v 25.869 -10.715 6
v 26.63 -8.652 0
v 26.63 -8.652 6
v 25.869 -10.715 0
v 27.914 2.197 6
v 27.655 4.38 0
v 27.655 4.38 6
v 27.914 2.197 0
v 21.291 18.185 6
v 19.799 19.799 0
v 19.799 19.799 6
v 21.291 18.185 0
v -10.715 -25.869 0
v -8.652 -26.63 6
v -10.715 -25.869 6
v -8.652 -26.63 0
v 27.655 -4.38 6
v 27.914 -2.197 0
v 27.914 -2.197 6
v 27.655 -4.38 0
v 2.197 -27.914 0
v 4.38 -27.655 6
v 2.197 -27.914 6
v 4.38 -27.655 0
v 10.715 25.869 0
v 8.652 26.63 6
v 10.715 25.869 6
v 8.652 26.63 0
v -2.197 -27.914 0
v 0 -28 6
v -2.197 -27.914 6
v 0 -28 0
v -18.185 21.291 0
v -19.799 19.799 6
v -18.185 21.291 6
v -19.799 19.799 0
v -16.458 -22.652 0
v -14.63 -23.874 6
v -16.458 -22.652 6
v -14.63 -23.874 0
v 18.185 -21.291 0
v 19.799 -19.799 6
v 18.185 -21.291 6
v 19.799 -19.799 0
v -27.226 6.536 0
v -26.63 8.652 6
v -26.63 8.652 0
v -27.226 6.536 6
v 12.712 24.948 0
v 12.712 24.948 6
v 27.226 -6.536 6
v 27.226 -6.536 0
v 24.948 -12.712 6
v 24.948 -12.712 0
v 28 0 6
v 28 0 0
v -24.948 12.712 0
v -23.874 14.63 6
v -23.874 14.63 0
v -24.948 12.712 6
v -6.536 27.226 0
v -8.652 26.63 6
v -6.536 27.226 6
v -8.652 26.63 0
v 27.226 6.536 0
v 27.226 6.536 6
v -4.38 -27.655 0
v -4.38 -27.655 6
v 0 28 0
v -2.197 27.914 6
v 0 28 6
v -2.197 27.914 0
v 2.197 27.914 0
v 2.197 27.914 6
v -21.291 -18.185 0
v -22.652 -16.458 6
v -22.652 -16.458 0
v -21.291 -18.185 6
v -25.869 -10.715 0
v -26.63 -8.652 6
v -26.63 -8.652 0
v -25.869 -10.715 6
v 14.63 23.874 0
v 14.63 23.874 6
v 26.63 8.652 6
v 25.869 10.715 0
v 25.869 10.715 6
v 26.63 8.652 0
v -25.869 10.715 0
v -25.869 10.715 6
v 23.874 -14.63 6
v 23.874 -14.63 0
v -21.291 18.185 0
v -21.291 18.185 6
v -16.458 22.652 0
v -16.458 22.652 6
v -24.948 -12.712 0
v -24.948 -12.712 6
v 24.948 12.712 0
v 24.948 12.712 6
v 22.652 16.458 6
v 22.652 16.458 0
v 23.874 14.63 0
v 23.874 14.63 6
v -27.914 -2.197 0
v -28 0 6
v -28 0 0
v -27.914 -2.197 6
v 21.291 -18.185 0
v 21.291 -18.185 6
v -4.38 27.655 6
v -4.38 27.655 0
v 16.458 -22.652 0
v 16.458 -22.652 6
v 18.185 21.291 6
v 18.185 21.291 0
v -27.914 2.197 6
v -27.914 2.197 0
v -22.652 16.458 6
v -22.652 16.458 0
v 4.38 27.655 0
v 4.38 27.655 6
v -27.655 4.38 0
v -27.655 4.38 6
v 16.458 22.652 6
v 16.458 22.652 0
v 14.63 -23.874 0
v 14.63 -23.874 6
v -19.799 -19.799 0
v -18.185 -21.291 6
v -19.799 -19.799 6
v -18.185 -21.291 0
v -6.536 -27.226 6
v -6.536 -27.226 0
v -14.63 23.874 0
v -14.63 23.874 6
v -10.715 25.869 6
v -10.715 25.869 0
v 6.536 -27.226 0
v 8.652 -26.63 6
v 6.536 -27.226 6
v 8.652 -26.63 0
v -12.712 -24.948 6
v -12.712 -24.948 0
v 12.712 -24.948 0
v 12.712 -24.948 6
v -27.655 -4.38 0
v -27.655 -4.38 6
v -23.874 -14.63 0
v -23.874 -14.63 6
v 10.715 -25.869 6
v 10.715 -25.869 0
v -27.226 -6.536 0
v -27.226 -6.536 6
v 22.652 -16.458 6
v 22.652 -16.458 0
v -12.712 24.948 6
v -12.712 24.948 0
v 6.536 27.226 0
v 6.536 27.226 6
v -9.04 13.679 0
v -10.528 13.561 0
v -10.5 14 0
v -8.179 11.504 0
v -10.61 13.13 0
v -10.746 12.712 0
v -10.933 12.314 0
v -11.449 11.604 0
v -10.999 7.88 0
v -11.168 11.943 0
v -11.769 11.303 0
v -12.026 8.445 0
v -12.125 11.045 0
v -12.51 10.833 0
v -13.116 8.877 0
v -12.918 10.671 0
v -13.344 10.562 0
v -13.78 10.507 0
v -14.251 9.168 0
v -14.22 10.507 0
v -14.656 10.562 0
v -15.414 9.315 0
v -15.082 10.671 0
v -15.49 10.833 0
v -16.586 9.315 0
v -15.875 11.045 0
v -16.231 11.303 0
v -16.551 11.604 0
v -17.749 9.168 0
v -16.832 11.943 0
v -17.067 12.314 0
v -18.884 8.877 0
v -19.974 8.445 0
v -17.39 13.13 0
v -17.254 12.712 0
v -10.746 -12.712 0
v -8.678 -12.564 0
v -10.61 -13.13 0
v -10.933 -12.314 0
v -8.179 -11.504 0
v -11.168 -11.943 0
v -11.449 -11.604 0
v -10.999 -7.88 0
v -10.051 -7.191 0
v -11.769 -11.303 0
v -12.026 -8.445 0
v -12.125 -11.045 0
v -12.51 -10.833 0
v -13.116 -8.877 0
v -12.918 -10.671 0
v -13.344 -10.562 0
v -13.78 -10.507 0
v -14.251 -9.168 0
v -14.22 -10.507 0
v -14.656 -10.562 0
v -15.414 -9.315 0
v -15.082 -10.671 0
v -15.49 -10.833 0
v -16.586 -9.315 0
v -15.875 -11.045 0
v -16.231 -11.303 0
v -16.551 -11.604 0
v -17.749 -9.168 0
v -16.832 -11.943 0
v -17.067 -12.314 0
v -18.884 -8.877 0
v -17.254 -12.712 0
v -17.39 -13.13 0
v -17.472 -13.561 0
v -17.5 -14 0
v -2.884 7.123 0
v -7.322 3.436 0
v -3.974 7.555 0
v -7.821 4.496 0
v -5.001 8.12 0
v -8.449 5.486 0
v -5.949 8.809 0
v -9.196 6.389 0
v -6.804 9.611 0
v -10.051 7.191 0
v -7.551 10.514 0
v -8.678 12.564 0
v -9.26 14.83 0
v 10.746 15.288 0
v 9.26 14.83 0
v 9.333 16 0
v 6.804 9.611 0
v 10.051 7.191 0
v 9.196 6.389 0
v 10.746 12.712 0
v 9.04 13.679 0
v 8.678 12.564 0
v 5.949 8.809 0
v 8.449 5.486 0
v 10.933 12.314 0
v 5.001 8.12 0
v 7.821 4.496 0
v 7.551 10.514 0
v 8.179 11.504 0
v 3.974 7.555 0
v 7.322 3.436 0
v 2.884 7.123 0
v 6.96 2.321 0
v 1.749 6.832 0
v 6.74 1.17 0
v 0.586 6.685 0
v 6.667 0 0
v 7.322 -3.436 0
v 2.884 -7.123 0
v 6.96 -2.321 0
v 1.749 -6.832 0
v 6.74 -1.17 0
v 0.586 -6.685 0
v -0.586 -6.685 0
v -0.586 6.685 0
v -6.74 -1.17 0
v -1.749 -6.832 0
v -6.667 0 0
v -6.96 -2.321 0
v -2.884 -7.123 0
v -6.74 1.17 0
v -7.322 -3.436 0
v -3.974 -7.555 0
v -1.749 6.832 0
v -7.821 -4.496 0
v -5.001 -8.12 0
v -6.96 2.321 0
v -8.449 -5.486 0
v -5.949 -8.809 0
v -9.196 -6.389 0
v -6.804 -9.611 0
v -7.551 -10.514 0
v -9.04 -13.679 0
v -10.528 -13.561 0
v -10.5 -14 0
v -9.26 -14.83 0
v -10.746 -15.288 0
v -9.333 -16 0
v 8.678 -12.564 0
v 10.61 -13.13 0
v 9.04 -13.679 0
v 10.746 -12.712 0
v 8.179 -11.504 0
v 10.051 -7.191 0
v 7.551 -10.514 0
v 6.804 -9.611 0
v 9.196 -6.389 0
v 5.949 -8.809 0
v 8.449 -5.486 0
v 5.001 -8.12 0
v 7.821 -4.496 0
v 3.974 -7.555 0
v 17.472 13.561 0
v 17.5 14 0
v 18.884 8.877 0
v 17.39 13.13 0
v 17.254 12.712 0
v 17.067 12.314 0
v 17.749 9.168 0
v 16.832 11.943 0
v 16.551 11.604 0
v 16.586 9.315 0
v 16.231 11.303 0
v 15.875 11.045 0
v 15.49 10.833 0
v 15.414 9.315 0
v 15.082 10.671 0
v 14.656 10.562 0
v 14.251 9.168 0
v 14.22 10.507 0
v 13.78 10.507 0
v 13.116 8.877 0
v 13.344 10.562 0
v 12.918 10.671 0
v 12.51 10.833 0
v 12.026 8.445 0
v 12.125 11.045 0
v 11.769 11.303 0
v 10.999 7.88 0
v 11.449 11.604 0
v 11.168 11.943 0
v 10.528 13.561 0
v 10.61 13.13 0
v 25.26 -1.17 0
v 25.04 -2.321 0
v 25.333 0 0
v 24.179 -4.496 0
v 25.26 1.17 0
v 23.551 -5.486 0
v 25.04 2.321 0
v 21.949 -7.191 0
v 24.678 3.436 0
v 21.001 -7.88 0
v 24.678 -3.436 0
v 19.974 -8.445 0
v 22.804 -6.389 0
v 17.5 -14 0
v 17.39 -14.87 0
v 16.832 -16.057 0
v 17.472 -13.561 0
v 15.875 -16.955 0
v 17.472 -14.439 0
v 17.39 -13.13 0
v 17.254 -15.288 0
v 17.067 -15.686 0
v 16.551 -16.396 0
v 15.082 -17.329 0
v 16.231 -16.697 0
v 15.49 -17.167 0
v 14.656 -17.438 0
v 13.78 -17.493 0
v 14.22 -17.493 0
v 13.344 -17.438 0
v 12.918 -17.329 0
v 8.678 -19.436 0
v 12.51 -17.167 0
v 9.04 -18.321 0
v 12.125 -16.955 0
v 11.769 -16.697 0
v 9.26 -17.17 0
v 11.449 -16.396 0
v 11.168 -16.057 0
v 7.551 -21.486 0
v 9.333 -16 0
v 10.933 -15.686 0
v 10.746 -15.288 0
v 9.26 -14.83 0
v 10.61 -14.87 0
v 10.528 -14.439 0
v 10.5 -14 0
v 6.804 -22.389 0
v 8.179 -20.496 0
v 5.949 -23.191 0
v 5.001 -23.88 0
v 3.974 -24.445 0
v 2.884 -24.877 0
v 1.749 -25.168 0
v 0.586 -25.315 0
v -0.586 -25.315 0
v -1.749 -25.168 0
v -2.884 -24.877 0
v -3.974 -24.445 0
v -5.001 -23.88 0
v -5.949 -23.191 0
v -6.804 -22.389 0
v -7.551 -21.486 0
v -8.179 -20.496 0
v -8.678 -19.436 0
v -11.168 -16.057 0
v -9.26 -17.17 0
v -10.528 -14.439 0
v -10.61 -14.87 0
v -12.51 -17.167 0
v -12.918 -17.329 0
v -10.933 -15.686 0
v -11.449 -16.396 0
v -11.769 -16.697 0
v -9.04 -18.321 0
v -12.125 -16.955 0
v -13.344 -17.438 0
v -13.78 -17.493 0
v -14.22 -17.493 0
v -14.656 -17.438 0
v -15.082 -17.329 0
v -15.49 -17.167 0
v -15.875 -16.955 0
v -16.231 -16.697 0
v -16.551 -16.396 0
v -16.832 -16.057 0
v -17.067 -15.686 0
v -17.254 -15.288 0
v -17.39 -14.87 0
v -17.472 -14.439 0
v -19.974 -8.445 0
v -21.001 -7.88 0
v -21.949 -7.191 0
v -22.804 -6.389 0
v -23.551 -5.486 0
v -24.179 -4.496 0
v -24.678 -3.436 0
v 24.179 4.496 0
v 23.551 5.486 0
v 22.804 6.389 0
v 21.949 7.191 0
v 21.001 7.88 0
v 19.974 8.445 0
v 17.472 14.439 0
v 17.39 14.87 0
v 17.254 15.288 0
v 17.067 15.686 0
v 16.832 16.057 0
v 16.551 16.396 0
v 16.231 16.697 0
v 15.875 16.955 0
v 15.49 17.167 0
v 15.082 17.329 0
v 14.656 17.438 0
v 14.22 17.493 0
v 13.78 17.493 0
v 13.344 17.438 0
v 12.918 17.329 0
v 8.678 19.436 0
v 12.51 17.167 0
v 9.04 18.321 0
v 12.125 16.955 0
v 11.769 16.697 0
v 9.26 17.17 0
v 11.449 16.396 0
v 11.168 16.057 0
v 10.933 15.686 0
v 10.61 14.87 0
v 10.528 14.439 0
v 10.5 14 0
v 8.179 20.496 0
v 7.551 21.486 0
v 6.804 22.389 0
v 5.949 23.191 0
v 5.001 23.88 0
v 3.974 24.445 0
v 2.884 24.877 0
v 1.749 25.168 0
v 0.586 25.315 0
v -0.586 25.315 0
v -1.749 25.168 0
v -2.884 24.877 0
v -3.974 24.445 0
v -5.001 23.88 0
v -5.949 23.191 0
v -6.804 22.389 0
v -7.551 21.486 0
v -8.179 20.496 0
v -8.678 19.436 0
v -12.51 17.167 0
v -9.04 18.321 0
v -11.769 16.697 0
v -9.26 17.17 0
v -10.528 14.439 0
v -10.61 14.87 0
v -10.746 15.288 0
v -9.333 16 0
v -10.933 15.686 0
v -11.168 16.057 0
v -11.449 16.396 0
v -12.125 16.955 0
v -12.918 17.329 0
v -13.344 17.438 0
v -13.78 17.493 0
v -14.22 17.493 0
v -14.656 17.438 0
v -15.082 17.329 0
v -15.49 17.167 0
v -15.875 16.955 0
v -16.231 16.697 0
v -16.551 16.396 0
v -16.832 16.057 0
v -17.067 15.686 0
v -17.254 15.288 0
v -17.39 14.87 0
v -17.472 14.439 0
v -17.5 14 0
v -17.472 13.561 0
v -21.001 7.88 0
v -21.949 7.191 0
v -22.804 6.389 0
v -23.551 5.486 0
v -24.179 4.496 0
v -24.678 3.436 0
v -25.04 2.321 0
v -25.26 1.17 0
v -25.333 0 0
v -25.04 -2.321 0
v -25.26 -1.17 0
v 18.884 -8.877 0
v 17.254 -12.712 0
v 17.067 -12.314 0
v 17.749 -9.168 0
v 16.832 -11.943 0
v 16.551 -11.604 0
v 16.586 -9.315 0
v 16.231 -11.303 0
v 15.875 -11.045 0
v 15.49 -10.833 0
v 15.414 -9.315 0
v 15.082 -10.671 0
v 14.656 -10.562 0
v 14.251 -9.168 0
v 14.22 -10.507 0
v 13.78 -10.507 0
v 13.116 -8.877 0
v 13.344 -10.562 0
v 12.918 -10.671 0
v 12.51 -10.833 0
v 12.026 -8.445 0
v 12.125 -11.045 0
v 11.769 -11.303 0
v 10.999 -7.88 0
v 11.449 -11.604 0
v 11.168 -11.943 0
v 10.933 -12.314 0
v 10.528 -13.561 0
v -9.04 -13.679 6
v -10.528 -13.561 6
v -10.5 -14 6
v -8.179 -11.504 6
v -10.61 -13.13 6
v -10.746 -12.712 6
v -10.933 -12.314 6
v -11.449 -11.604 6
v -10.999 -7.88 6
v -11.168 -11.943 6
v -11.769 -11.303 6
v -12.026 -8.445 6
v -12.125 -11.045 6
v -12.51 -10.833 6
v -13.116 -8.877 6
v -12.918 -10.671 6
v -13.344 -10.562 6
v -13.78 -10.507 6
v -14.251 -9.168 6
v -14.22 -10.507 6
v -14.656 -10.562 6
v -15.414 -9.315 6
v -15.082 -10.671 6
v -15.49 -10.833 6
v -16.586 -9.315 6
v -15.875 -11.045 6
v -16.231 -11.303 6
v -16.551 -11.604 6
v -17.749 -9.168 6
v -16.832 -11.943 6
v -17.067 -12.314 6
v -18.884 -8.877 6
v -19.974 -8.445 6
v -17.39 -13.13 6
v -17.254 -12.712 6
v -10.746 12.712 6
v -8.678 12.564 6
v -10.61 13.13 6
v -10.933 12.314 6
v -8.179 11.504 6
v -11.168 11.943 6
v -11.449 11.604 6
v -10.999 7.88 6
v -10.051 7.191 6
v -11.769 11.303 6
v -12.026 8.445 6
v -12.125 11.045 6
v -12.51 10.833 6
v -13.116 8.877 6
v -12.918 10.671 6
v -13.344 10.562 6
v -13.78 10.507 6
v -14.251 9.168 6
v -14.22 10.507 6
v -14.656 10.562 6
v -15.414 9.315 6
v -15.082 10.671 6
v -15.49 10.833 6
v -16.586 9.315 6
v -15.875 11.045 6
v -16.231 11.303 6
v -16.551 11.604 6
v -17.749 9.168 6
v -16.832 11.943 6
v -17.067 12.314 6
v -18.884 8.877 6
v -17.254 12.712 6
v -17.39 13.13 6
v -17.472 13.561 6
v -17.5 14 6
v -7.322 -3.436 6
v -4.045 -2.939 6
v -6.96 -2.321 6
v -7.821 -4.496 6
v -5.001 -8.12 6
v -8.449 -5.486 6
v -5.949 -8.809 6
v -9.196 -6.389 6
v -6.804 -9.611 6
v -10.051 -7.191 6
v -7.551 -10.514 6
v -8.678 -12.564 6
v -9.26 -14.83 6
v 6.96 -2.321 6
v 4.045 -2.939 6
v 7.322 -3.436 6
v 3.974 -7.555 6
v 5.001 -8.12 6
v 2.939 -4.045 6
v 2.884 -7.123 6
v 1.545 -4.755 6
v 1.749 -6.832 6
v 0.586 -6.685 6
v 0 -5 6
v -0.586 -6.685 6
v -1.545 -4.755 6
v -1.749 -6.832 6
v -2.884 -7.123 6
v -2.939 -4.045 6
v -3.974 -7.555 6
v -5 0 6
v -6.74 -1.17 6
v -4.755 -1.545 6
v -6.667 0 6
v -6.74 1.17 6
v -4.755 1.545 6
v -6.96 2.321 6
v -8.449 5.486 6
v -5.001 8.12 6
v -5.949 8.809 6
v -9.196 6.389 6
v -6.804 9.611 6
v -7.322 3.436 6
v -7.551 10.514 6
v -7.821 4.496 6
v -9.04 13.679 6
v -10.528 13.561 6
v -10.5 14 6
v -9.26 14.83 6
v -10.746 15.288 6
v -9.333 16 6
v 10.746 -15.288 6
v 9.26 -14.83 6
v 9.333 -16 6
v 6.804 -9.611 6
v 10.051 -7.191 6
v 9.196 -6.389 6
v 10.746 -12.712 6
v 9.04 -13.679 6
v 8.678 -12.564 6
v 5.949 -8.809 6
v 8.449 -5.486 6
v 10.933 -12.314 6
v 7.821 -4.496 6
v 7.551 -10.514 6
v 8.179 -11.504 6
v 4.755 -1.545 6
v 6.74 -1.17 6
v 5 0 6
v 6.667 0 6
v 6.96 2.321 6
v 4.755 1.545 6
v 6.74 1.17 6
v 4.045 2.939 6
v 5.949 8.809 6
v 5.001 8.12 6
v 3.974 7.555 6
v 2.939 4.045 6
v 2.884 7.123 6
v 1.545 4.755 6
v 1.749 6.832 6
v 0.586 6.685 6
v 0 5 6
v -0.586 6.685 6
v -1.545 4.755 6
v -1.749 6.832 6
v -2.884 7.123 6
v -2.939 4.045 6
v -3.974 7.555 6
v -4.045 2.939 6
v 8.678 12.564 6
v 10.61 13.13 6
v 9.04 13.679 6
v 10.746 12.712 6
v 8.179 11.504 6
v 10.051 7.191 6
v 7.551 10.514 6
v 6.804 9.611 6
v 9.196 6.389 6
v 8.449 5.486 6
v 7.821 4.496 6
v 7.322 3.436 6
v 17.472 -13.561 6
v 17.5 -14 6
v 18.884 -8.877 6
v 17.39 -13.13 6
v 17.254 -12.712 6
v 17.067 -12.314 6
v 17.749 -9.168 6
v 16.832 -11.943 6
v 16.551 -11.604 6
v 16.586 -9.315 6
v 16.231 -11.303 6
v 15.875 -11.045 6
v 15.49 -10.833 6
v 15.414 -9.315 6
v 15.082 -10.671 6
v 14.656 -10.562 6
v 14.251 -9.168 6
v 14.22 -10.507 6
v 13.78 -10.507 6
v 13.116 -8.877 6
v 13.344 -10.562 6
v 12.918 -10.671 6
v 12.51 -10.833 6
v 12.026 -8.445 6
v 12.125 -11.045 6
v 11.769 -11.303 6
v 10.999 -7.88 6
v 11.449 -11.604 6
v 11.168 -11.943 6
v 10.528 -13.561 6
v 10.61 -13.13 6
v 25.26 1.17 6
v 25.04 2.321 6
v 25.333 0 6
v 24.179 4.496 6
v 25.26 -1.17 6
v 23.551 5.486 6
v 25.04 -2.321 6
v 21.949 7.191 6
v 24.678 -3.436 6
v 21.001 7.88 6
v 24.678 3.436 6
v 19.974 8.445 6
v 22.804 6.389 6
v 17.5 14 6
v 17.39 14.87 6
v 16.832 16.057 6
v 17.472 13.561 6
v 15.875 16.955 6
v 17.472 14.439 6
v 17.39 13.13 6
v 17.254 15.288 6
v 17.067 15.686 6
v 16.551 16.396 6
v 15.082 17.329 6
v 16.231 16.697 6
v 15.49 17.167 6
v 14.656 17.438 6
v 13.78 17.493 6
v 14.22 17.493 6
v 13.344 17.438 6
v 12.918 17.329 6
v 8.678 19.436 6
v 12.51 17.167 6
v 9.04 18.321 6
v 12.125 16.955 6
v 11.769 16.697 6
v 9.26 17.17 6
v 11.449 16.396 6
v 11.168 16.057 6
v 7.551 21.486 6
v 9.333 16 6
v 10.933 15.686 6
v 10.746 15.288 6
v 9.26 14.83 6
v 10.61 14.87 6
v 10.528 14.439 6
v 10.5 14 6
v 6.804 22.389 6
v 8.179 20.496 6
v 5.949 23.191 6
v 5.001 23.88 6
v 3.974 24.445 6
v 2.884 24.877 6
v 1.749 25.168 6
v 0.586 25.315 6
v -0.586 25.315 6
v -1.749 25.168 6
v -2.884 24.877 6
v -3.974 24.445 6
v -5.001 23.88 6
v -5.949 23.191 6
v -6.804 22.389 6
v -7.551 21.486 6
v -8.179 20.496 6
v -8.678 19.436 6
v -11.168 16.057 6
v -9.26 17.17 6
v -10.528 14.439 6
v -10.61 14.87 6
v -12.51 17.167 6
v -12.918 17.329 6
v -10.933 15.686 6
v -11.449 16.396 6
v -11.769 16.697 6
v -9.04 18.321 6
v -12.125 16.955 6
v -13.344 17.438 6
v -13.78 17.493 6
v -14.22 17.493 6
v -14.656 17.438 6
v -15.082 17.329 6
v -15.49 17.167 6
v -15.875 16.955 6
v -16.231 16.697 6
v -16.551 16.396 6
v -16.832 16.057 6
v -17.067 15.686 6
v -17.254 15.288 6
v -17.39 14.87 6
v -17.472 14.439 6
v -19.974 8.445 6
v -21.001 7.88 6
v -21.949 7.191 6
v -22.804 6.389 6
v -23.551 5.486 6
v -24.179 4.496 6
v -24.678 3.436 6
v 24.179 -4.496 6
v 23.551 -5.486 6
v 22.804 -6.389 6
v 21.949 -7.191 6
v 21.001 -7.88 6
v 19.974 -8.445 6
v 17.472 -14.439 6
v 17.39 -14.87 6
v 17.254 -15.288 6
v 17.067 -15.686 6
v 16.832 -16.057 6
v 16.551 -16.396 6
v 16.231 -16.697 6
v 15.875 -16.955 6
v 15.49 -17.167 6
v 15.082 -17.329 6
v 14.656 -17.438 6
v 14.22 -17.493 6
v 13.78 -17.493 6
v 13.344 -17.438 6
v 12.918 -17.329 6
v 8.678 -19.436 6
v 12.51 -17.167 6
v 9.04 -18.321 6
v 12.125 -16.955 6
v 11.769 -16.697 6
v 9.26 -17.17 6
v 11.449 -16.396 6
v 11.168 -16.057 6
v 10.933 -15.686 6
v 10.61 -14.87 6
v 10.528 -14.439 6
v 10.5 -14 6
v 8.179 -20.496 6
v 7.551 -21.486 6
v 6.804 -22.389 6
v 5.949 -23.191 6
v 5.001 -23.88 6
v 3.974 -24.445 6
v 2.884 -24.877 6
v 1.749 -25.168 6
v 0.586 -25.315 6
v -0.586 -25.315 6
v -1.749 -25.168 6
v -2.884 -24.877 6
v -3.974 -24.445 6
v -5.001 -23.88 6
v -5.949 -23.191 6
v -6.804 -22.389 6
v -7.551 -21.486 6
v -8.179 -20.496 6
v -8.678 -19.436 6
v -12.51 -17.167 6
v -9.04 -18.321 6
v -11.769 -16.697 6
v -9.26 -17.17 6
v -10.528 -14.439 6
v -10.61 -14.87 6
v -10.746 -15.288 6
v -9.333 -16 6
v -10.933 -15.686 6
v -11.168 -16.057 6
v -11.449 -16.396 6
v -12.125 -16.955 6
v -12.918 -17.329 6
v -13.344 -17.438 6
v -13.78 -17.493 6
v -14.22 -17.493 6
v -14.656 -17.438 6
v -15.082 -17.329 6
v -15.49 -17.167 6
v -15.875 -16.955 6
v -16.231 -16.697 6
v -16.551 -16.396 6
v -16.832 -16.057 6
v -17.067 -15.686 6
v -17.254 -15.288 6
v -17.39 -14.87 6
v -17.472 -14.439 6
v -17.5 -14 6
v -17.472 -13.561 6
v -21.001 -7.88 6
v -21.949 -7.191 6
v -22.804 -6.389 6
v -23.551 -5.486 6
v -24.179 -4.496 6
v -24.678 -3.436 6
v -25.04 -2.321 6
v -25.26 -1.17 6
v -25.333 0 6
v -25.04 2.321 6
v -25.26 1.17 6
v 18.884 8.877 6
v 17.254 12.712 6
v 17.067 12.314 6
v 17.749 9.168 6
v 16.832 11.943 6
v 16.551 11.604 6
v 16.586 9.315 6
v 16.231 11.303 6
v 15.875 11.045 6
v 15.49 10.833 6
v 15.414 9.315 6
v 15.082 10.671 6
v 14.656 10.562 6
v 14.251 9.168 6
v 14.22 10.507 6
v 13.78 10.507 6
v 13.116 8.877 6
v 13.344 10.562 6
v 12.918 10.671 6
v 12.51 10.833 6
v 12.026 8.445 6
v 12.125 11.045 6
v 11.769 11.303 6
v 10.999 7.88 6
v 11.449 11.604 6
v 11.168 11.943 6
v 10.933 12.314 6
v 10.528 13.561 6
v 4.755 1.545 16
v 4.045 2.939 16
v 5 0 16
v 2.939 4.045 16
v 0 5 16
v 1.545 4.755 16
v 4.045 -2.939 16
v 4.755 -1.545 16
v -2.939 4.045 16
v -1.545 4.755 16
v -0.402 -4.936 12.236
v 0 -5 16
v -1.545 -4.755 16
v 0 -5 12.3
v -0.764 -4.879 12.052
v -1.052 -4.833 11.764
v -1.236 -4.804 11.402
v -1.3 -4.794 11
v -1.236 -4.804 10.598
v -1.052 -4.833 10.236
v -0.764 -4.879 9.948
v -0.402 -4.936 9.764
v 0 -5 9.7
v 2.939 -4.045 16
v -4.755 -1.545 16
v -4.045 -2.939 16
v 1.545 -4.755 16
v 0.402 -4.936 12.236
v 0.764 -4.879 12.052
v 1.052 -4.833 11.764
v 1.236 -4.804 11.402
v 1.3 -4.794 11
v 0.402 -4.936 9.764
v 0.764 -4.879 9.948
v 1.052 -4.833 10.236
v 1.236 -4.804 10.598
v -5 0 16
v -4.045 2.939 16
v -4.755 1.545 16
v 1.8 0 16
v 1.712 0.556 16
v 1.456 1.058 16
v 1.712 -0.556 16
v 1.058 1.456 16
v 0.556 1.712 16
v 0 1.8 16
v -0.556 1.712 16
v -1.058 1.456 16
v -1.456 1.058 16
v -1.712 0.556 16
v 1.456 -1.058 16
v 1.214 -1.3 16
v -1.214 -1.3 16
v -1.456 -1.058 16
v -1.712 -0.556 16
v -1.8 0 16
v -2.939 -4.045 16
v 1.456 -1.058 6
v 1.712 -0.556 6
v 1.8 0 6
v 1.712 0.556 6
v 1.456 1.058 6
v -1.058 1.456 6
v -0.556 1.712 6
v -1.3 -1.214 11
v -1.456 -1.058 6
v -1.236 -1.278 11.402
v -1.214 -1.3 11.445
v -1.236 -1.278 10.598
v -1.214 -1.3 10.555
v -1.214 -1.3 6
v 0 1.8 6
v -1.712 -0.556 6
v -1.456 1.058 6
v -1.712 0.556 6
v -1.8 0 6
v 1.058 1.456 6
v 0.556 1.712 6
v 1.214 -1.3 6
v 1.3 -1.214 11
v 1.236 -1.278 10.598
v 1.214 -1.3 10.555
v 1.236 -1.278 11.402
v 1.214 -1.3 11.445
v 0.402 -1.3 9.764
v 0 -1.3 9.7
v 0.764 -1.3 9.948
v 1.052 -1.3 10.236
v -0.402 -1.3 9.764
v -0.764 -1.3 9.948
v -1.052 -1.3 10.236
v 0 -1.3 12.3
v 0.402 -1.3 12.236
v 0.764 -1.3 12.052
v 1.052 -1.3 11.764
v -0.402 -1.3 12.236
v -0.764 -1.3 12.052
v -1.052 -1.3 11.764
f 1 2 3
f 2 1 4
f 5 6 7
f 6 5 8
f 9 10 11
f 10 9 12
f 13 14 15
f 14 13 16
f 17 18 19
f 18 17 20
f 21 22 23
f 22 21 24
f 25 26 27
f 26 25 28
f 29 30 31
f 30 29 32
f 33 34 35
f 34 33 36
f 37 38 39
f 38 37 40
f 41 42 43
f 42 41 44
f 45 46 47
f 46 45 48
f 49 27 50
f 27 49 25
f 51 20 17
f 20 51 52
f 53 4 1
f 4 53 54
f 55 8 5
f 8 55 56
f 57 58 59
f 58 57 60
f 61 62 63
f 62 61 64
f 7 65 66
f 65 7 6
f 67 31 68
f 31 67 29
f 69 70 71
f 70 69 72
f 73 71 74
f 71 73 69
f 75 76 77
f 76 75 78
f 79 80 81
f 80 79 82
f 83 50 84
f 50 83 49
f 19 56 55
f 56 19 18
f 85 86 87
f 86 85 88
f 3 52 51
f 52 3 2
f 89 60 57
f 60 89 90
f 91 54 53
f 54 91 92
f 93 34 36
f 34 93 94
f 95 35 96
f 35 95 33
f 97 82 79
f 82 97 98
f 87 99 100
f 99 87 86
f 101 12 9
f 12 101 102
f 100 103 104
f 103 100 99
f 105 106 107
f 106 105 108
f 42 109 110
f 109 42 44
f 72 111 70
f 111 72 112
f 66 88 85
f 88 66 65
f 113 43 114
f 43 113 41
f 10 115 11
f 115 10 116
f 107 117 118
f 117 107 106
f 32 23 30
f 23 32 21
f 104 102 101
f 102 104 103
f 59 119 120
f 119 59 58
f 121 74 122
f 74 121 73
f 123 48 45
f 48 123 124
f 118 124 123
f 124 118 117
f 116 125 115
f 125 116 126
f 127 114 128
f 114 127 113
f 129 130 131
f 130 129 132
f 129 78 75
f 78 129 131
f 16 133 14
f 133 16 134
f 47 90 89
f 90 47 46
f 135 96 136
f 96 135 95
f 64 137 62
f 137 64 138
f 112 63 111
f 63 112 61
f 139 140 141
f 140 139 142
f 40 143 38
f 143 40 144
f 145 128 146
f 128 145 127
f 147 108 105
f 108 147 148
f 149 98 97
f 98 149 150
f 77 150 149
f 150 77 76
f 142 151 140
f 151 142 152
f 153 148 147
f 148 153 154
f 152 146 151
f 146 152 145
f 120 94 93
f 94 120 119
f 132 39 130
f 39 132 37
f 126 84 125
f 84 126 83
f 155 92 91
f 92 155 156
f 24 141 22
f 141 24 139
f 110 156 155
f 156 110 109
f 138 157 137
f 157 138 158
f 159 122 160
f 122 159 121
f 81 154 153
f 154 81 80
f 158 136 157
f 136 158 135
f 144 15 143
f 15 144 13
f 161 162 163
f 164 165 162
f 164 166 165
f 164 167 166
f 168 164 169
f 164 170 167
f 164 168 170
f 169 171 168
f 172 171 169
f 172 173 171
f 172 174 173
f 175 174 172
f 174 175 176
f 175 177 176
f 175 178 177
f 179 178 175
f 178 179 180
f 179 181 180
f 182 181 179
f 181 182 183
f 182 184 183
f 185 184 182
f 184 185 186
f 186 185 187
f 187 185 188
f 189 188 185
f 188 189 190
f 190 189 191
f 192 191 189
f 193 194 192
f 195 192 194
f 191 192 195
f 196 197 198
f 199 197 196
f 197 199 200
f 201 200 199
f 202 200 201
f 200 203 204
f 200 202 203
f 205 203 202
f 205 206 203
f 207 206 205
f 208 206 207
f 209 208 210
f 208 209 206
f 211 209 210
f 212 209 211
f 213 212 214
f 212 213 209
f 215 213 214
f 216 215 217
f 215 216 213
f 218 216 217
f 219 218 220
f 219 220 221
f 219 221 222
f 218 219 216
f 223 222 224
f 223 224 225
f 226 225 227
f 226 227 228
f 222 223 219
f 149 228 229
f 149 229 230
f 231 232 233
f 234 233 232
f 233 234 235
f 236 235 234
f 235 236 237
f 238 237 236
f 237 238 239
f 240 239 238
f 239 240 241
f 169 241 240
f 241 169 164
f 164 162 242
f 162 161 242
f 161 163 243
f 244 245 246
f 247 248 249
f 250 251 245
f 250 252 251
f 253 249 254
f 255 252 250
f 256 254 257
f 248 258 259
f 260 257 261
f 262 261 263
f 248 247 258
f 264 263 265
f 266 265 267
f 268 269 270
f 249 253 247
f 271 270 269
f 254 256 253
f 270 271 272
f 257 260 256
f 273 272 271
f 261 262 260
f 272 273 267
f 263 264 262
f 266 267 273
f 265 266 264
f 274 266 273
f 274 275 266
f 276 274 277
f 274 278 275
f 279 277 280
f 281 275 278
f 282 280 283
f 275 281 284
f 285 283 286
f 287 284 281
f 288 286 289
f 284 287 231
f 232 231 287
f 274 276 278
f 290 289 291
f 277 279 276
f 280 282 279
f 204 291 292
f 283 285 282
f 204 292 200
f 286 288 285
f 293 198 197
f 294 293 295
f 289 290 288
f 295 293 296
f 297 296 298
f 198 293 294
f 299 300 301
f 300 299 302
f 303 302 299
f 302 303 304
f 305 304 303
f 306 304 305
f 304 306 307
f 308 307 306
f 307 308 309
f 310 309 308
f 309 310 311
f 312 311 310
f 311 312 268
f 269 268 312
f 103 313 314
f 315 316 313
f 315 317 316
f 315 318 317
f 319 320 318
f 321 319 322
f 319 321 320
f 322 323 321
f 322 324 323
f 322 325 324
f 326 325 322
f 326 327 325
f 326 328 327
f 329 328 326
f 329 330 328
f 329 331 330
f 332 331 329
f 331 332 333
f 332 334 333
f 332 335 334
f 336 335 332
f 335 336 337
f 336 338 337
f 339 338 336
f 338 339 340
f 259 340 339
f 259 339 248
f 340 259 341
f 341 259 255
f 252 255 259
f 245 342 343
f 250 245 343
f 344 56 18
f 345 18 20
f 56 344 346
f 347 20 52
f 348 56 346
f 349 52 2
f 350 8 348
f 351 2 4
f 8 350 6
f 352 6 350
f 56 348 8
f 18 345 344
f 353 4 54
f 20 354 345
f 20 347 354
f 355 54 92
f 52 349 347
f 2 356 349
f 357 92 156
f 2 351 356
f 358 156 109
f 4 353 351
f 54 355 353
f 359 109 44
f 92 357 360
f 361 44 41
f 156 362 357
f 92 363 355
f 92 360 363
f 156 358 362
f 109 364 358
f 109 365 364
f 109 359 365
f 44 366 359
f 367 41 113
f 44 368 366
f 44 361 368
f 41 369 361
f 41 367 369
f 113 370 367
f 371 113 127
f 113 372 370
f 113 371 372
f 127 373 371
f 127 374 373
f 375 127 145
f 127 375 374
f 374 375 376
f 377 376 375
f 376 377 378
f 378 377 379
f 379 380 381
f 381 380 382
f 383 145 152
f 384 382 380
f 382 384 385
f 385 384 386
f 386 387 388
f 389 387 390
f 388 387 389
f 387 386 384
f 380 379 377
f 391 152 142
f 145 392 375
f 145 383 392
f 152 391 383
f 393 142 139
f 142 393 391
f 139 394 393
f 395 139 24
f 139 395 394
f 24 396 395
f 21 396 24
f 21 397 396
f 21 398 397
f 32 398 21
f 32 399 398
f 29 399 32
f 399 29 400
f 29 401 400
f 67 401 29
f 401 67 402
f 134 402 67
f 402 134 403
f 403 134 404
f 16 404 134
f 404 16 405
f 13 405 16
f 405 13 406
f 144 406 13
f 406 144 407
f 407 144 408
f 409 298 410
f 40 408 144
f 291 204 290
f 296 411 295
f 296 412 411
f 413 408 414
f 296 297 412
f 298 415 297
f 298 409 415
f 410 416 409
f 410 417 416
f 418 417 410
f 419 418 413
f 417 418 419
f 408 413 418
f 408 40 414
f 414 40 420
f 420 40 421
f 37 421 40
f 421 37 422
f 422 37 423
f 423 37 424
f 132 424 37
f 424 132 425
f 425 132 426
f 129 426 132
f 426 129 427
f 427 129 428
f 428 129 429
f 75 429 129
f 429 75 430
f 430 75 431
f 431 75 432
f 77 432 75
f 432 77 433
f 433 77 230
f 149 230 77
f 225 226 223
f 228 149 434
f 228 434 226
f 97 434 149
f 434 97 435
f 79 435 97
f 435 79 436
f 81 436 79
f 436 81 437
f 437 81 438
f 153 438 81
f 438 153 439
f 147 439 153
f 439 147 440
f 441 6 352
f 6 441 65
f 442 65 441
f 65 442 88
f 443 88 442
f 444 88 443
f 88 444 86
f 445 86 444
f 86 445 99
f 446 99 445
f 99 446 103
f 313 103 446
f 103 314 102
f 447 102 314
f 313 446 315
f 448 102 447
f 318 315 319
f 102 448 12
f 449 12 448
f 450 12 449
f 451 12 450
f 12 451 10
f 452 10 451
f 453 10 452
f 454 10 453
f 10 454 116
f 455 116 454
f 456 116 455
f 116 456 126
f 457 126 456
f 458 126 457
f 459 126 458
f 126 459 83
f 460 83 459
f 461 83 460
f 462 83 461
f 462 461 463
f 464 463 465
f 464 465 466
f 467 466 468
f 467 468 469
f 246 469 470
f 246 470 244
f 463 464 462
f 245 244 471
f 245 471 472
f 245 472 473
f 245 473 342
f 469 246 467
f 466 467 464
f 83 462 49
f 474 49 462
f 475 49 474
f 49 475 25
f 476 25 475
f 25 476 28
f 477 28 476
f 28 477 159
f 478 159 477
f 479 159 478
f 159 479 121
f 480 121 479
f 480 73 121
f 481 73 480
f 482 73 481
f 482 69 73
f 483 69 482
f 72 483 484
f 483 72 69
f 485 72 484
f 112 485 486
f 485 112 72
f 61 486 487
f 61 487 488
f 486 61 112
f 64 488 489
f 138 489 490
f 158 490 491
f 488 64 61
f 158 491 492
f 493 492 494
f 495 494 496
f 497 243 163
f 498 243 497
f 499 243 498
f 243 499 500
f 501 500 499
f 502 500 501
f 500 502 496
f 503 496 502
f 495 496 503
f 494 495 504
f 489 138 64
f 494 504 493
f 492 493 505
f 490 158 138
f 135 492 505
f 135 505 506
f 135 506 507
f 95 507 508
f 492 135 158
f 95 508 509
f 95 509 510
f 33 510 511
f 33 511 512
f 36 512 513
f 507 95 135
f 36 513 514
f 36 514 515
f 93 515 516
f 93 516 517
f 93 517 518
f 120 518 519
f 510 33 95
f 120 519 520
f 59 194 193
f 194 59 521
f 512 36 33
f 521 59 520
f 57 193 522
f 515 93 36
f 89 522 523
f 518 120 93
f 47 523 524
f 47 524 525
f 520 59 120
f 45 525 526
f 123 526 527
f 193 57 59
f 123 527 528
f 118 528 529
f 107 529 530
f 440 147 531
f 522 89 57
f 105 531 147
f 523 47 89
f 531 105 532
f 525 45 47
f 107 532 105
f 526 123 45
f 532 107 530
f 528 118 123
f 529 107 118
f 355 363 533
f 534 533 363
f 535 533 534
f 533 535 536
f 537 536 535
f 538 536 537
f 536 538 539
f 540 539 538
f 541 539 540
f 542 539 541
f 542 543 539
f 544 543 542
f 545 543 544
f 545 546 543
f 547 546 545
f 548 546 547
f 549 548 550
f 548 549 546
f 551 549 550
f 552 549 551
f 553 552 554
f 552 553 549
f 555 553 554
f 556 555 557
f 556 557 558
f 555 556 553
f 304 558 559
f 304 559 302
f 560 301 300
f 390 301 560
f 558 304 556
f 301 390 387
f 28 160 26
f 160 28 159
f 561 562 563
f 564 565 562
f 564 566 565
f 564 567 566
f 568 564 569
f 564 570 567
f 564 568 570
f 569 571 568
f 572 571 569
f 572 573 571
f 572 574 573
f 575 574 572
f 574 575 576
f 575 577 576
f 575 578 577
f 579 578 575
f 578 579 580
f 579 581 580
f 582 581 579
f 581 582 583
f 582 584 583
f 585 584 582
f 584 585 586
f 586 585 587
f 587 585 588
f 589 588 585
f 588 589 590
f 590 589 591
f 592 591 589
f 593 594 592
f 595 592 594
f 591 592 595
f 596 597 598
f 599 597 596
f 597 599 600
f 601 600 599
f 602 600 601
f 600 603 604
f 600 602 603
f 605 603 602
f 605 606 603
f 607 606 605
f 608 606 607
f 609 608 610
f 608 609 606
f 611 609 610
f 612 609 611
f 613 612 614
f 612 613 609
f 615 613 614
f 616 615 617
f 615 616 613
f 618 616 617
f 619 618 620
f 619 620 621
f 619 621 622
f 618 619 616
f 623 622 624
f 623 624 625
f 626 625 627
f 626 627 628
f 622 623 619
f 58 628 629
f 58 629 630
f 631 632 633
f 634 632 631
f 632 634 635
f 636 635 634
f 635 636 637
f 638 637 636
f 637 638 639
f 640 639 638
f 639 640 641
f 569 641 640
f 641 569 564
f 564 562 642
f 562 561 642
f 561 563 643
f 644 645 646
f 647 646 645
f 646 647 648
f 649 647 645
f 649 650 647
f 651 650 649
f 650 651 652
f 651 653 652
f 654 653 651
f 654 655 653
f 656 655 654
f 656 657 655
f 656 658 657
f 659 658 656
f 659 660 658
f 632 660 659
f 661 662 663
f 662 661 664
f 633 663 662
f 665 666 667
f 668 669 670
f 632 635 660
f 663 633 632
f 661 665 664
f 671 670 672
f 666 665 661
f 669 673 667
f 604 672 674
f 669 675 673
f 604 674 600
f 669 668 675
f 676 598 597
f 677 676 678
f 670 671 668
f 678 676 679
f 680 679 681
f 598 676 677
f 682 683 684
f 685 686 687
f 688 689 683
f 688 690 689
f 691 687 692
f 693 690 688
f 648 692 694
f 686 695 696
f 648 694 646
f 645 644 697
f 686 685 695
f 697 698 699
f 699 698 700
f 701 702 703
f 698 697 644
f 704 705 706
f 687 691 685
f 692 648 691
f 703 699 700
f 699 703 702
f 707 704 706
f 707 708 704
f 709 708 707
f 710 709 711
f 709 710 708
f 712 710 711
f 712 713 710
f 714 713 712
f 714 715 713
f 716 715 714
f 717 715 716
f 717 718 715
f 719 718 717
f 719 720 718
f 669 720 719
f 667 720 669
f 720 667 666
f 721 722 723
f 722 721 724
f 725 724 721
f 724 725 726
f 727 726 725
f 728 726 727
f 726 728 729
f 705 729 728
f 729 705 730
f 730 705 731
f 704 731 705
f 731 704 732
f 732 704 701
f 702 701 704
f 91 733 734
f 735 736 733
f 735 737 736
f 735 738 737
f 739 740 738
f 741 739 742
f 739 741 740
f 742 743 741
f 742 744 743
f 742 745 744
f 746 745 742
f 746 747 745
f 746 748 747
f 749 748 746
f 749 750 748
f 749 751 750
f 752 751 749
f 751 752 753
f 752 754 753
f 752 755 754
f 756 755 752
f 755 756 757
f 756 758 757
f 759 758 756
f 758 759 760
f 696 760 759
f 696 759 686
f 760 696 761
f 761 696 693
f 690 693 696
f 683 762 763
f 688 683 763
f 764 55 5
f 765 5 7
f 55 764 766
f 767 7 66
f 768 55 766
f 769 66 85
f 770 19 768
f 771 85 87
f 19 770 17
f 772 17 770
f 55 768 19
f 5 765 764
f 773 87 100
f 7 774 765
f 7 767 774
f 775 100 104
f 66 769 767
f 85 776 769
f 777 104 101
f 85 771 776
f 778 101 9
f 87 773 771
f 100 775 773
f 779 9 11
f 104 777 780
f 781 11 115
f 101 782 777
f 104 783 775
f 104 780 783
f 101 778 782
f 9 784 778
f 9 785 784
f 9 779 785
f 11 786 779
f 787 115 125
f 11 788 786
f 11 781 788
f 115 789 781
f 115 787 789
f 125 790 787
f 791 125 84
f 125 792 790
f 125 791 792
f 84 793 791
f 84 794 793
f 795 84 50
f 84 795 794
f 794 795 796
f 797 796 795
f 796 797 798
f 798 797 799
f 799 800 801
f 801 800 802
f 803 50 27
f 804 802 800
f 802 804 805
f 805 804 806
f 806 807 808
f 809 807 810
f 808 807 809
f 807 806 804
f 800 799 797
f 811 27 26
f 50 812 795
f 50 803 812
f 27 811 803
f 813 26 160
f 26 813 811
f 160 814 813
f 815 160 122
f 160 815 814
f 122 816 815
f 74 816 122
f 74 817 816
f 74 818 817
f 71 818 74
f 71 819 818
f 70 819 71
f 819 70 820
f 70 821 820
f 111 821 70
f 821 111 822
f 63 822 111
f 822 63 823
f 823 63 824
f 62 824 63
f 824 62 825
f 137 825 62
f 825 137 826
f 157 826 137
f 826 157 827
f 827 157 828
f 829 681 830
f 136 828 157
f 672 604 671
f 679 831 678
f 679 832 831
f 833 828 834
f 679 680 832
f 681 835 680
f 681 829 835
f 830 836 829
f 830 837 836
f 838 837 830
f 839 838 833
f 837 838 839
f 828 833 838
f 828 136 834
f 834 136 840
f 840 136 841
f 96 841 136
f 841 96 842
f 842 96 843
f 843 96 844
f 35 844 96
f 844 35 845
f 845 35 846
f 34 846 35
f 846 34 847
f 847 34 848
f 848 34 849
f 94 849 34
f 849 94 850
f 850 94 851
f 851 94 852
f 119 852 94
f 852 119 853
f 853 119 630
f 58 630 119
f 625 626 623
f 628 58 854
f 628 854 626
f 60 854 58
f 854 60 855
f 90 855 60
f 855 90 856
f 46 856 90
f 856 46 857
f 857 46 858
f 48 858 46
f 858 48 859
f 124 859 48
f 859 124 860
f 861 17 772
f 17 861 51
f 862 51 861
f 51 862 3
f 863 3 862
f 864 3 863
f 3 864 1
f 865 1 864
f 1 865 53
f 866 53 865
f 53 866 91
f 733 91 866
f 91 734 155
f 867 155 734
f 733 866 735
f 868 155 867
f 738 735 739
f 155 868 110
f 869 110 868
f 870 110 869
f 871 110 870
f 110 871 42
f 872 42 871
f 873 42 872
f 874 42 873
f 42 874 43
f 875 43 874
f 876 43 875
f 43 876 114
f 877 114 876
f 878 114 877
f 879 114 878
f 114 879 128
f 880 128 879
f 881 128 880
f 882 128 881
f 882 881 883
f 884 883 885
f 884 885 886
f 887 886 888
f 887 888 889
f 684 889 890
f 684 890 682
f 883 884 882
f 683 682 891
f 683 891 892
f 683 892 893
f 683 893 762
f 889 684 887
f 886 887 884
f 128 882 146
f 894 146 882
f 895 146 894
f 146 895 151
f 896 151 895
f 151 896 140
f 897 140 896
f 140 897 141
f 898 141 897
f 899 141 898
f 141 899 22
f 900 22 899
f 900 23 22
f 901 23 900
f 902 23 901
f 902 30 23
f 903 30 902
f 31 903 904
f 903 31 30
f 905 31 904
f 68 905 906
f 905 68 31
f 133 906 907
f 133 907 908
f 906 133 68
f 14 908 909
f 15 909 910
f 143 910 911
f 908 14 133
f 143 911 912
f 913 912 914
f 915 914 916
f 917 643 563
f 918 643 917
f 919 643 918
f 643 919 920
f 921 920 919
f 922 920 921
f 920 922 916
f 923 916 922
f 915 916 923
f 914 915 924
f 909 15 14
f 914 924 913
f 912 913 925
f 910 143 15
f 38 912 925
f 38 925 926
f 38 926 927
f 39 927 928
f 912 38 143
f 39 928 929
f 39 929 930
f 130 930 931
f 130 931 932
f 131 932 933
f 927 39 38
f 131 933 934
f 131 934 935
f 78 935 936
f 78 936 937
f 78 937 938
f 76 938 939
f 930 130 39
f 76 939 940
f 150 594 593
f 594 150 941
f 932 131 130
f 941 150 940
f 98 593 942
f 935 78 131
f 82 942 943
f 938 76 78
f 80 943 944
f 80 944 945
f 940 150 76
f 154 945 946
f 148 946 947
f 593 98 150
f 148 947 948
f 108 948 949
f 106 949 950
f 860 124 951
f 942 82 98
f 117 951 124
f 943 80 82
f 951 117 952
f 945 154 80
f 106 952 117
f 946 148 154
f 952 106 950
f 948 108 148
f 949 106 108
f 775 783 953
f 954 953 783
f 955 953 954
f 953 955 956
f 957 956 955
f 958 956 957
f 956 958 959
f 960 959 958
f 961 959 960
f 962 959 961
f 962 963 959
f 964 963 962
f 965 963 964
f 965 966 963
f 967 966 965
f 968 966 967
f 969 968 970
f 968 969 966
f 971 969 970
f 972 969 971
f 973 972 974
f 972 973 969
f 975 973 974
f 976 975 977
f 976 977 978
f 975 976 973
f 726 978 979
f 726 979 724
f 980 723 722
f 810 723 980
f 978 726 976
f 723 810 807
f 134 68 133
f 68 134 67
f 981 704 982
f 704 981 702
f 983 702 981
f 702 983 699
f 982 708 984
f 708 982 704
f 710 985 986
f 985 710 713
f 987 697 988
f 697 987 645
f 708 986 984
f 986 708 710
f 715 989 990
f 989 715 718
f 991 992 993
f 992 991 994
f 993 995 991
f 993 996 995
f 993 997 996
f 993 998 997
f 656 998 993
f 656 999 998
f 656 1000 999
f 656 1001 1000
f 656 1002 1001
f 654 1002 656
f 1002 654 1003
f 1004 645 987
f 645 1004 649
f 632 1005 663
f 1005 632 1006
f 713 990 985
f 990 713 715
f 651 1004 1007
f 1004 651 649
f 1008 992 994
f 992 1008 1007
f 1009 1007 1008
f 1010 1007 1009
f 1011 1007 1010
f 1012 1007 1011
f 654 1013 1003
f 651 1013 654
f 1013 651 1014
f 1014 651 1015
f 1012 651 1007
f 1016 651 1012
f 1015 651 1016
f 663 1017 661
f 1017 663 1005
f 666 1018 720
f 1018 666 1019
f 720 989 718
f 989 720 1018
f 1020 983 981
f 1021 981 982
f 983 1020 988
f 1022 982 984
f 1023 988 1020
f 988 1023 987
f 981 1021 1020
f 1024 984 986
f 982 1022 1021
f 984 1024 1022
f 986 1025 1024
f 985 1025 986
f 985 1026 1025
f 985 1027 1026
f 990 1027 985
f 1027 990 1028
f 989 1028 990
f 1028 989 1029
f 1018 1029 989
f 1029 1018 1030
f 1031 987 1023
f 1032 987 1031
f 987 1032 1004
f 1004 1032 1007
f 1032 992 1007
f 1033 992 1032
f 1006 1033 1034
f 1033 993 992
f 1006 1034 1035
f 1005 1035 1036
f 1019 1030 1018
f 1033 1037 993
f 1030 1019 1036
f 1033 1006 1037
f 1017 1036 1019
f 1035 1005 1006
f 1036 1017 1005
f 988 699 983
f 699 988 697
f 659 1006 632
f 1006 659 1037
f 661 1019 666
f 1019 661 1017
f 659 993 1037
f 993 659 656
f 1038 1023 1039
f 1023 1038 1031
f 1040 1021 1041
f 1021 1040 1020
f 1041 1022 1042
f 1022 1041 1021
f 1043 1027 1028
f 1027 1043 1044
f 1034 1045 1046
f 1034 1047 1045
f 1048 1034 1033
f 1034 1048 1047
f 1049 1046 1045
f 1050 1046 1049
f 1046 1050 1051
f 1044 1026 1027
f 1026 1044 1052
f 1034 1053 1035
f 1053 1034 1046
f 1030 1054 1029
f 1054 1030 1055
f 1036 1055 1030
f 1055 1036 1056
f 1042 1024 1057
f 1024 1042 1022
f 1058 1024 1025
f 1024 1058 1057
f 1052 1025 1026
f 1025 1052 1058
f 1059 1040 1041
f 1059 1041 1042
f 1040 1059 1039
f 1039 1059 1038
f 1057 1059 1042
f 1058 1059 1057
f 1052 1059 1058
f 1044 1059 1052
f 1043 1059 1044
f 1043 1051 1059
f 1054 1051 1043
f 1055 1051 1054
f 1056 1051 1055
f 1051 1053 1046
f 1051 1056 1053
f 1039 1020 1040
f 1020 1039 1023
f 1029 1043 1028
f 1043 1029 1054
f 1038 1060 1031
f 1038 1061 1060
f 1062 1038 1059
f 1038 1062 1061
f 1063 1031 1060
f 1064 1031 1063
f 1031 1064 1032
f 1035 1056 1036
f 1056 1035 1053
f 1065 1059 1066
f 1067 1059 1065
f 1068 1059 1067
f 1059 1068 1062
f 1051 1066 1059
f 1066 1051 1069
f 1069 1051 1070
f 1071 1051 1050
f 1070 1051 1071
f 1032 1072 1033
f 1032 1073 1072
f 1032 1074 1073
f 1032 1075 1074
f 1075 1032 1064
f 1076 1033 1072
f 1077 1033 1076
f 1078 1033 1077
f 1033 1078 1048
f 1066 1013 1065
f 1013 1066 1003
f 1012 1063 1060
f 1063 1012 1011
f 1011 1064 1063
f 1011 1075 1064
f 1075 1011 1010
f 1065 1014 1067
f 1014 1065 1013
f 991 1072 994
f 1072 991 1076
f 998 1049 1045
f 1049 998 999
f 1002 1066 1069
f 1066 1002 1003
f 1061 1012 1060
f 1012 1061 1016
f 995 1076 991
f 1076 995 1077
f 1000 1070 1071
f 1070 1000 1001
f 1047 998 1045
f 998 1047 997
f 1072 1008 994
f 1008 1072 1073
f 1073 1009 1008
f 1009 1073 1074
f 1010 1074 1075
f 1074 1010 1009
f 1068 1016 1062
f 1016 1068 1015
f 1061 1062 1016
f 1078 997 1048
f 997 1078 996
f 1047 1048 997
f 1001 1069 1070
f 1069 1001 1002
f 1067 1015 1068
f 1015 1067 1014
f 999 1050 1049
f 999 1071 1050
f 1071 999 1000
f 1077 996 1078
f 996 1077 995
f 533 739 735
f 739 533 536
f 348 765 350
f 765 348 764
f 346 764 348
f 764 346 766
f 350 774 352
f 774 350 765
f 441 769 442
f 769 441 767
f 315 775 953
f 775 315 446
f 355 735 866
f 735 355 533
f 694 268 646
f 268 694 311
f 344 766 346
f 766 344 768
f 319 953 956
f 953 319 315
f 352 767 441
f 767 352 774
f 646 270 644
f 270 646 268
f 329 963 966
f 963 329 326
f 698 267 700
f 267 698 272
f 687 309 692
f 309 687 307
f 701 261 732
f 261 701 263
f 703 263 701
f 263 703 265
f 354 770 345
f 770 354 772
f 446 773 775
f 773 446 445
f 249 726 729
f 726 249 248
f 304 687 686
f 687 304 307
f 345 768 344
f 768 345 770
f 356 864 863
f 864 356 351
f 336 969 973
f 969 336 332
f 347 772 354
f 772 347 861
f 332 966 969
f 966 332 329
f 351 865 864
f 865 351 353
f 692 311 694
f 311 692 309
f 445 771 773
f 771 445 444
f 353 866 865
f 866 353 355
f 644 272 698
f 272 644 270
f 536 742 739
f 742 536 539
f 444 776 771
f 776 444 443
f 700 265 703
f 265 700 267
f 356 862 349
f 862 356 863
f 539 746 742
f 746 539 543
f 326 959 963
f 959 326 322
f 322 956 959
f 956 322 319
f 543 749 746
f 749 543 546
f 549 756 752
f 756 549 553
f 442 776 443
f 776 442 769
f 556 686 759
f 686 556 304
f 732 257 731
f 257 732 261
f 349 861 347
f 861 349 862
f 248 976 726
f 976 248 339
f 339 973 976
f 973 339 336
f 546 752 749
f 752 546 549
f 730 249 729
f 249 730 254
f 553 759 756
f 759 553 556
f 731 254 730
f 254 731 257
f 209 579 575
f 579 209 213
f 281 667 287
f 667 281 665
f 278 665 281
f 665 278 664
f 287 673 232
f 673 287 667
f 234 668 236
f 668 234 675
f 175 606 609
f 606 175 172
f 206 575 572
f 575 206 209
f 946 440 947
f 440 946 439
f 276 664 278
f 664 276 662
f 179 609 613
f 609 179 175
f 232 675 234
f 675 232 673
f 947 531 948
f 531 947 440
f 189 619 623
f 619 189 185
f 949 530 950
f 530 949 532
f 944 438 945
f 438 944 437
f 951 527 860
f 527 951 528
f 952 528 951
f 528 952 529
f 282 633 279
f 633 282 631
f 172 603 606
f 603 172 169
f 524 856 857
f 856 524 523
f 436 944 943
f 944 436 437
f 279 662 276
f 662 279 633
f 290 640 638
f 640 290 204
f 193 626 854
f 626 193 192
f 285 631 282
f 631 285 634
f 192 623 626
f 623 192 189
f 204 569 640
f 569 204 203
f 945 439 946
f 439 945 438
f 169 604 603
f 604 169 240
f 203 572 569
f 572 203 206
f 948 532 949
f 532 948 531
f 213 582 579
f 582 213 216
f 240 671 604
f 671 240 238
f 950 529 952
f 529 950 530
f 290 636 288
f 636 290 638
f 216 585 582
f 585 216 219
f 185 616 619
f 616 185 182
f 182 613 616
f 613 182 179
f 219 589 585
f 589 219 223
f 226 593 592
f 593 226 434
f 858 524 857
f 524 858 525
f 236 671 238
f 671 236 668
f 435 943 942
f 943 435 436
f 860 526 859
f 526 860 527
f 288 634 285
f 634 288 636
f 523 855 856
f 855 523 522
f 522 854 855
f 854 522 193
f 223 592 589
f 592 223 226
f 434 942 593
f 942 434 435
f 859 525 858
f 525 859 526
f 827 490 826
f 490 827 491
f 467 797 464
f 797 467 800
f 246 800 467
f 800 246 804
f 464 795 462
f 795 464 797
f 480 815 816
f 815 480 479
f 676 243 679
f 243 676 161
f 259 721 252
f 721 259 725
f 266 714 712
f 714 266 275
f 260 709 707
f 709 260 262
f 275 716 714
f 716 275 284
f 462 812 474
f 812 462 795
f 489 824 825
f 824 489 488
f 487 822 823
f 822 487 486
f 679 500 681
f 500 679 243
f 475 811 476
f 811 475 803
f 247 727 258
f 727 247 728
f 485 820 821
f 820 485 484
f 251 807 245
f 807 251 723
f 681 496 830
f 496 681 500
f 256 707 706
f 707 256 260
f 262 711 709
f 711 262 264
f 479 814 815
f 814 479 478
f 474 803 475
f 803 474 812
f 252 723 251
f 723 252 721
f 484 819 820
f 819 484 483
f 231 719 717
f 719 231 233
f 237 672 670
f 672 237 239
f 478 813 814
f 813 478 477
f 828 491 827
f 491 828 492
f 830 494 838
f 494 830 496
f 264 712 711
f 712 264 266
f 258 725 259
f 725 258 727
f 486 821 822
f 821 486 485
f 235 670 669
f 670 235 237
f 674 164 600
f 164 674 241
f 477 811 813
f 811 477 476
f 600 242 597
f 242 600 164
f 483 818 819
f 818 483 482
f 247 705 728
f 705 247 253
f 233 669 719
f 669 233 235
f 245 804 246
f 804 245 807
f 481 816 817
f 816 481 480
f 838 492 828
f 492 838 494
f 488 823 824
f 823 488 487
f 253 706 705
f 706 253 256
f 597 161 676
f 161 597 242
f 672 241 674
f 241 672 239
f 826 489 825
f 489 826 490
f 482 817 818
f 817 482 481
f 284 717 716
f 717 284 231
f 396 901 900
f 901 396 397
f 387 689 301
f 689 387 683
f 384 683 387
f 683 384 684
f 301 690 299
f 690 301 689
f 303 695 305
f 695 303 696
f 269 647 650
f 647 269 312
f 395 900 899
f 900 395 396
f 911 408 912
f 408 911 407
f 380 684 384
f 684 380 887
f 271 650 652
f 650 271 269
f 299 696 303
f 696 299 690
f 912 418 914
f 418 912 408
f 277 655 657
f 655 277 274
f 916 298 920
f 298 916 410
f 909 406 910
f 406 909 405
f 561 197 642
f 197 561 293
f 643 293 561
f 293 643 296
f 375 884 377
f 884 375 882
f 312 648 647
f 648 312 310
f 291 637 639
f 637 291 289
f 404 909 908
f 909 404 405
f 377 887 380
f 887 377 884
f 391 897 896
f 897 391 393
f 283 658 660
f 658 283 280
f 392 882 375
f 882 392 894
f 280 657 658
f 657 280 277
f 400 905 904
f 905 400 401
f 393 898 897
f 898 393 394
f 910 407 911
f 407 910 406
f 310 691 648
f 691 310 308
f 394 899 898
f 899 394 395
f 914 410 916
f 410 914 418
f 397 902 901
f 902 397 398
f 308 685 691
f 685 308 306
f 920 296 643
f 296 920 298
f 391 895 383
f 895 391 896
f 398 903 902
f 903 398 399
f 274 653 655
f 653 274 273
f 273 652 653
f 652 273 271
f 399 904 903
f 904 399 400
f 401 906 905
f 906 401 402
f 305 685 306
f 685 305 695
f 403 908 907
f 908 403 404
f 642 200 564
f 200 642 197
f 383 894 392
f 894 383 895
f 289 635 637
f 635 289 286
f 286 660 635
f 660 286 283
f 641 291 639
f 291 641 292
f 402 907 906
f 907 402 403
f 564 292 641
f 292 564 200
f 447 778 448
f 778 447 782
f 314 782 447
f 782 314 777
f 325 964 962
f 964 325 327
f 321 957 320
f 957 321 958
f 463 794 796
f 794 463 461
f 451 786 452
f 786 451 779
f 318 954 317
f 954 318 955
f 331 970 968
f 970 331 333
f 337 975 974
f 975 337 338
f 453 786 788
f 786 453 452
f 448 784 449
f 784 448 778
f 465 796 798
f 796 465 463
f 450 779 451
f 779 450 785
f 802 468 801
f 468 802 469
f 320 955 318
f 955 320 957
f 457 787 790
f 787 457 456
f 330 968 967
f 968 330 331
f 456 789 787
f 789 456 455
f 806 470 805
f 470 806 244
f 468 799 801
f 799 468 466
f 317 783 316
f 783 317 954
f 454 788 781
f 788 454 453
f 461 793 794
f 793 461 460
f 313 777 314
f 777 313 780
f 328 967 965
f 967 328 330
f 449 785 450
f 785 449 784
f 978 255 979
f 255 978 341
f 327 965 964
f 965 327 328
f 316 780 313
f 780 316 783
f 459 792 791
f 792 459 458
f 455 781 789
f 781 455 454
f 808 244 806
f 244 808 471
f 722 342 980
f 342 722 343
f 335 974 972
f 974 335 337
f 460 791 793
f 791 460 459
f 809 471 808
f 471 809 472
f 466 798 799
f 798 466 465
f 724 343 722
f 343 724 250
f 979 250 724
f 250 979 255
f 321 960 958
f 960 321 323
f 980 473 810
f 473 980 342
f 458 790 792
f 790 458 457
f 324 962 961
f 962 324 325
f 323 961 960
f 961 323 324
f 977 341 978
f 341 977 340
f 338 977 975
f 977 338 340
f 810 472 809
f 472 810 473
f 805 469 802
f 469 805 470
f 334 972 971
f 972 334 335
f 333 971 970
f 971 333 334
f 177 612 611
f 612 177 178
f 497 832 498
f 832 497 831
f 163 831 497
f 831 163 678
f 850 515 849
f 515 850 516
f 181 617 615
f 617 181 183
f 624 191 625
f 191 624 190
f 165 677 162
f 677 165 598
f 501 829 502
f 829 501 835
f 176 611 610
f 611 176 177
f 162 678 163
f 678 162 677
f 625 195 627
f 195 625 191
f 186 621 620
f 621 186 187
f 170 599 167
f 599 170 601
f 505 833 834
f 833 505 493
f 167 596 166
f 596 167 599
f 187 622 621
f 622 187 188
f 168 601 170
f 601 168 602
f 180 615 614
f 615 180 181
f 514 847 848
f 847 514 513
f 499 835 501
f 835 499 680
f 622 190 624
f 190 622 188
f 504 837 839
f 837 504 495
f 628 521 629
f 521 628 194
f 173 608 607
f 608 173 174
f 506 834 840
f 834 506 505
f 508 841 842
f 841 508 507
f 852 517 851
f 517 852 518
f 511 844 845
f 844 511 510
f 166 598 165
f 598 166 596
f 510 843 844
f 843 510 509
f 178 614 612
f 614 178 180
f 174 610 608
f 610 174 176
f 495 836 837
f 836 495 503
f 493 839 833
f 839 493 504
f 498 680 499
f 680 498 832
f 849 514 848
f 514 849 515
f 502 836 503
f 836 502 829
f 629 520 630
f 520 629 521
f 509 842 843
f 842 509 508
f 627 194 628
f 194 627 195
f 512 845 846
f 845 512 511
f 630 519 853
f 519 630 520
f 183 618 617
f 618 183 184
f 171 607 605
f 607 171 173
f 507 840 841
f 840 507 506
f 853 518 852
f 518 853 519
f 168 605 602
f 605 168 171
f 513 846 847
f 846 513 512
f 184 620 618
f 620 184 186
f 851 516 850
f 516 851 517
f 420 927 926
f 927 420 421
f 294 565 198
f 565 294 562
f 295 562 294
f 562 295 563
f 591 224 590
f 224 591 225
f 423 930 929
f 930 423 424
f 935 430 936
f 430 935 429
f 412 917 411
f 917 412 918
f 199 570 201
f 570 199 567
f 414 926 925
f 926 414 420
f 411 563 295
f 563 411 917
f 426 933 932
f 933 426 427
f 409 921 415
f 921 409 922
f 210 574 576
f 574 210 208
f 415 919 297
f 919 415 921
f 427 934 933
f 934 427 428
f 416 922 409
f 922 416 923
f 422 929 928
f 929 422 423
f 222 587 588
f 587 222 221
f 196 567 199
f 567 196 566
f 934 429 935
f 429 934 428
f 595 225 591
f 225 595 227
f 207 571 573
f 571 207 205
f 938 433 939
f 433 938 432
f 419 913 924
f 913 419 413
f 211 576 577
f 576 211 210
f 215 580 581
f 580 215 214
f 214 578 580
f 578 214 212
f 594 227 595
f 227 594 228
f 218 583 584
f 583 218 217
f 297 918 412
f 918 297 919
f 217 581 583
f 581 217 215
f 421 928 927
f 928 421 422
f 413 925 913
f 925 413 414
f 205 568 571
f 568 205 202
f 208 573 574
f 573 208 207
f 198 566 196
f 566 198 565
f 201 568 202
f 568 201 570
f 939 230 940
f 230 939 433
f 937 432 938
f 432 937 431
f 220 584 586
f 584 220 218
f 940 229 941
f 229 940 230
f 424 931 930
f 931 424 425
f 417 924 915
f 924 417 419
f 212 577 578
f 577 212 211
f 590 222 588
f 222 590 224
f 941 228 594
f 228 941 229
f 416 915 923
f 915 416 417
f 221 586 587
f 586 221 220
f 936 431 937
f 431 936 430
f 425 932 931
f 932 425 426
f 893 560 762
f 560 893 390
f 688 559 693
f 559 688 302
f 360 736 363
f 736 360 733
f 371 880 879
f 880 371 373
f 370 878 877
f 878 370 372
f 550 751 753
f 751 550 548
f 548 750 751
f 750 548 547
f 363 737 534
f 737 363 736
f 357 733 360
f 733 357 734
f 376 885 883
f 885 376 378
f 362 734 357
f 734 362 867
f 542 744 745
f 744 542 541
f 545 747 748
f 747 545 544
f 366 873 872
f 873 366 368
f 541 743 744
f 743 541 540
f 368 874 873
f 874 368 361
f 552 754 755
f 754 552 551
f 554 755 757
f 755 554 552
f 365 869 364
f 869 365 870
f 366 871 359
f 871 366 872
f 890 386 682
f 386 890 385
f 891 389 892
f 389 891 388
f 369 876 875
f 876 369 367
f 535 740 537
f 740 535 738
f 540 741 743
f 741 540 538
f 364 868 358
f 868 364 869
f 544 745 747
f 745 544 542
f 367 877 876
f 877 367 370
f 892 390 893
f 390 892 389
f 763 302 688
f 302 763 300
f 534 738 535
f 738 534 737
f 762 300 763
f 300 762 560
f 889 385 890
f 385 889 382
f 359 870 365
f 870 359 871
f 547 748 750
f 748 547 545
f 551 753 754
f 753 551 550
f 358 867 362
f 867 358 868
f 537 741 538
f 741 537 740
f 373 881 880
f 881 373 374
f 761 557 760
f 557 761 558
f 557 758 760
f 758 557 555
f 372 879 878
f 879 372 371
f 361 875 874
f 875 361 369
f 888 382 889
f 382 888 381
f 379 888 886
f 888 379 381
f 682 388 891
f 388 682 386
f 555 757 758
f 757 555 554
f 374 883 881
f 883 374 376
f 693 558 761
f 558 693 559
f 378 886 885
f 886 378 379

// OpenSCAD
/*funciona ben entre radios de 20 e de 80. */


radio=28;
altura=6;

difference(){
	union(){
		cylinder(r=radio,h=altura,$fn=80);
		cylinder(r=5, h=10+altura, $fn=20);
	}
		intersection(){	
		translate ([0,0,altura]) cylinder (r=1.8,h=14,$fn=20);
		
		translate([-3,-1.3,0]) #cube([6,6,20]);
		
		}
	translate ([0,0,5+altura]) rotate([90,0,0]) cylinder (r=1.3,h=10+altura,$fn=20);

translate ([(radio/2+2),0,0]) cylinder (r=radio/3,h=altura,$fn=50);
translate ([-(radio/2+2),0,0]) cylinder (r=radio/3,h=altura,$fn=50);
translate ([0,(radio/2+2),0]) cylinder (r=radio/3,h=altura,$fn=50);
translate ([0,-(radio/2+2),0]) cylinder (r=radio/3,h=altura,$fn=50);

translate ([(radio/2),(radio/2),0]) cylinder (r=radio/8,h=altura,$fn=50);
translate ([-radio/2,(radio/2),0]) cylinder (r=radio/8,h=altura,$fn=50);
translate ([-(radio/2),-(radio/2),0]) cylinder (r=radio/8,h=altura,$fn=50);
translate ([(radio/2),-(radio/2),0]) cylinder (r=radio/8,h=altura,$fn=50);

}
